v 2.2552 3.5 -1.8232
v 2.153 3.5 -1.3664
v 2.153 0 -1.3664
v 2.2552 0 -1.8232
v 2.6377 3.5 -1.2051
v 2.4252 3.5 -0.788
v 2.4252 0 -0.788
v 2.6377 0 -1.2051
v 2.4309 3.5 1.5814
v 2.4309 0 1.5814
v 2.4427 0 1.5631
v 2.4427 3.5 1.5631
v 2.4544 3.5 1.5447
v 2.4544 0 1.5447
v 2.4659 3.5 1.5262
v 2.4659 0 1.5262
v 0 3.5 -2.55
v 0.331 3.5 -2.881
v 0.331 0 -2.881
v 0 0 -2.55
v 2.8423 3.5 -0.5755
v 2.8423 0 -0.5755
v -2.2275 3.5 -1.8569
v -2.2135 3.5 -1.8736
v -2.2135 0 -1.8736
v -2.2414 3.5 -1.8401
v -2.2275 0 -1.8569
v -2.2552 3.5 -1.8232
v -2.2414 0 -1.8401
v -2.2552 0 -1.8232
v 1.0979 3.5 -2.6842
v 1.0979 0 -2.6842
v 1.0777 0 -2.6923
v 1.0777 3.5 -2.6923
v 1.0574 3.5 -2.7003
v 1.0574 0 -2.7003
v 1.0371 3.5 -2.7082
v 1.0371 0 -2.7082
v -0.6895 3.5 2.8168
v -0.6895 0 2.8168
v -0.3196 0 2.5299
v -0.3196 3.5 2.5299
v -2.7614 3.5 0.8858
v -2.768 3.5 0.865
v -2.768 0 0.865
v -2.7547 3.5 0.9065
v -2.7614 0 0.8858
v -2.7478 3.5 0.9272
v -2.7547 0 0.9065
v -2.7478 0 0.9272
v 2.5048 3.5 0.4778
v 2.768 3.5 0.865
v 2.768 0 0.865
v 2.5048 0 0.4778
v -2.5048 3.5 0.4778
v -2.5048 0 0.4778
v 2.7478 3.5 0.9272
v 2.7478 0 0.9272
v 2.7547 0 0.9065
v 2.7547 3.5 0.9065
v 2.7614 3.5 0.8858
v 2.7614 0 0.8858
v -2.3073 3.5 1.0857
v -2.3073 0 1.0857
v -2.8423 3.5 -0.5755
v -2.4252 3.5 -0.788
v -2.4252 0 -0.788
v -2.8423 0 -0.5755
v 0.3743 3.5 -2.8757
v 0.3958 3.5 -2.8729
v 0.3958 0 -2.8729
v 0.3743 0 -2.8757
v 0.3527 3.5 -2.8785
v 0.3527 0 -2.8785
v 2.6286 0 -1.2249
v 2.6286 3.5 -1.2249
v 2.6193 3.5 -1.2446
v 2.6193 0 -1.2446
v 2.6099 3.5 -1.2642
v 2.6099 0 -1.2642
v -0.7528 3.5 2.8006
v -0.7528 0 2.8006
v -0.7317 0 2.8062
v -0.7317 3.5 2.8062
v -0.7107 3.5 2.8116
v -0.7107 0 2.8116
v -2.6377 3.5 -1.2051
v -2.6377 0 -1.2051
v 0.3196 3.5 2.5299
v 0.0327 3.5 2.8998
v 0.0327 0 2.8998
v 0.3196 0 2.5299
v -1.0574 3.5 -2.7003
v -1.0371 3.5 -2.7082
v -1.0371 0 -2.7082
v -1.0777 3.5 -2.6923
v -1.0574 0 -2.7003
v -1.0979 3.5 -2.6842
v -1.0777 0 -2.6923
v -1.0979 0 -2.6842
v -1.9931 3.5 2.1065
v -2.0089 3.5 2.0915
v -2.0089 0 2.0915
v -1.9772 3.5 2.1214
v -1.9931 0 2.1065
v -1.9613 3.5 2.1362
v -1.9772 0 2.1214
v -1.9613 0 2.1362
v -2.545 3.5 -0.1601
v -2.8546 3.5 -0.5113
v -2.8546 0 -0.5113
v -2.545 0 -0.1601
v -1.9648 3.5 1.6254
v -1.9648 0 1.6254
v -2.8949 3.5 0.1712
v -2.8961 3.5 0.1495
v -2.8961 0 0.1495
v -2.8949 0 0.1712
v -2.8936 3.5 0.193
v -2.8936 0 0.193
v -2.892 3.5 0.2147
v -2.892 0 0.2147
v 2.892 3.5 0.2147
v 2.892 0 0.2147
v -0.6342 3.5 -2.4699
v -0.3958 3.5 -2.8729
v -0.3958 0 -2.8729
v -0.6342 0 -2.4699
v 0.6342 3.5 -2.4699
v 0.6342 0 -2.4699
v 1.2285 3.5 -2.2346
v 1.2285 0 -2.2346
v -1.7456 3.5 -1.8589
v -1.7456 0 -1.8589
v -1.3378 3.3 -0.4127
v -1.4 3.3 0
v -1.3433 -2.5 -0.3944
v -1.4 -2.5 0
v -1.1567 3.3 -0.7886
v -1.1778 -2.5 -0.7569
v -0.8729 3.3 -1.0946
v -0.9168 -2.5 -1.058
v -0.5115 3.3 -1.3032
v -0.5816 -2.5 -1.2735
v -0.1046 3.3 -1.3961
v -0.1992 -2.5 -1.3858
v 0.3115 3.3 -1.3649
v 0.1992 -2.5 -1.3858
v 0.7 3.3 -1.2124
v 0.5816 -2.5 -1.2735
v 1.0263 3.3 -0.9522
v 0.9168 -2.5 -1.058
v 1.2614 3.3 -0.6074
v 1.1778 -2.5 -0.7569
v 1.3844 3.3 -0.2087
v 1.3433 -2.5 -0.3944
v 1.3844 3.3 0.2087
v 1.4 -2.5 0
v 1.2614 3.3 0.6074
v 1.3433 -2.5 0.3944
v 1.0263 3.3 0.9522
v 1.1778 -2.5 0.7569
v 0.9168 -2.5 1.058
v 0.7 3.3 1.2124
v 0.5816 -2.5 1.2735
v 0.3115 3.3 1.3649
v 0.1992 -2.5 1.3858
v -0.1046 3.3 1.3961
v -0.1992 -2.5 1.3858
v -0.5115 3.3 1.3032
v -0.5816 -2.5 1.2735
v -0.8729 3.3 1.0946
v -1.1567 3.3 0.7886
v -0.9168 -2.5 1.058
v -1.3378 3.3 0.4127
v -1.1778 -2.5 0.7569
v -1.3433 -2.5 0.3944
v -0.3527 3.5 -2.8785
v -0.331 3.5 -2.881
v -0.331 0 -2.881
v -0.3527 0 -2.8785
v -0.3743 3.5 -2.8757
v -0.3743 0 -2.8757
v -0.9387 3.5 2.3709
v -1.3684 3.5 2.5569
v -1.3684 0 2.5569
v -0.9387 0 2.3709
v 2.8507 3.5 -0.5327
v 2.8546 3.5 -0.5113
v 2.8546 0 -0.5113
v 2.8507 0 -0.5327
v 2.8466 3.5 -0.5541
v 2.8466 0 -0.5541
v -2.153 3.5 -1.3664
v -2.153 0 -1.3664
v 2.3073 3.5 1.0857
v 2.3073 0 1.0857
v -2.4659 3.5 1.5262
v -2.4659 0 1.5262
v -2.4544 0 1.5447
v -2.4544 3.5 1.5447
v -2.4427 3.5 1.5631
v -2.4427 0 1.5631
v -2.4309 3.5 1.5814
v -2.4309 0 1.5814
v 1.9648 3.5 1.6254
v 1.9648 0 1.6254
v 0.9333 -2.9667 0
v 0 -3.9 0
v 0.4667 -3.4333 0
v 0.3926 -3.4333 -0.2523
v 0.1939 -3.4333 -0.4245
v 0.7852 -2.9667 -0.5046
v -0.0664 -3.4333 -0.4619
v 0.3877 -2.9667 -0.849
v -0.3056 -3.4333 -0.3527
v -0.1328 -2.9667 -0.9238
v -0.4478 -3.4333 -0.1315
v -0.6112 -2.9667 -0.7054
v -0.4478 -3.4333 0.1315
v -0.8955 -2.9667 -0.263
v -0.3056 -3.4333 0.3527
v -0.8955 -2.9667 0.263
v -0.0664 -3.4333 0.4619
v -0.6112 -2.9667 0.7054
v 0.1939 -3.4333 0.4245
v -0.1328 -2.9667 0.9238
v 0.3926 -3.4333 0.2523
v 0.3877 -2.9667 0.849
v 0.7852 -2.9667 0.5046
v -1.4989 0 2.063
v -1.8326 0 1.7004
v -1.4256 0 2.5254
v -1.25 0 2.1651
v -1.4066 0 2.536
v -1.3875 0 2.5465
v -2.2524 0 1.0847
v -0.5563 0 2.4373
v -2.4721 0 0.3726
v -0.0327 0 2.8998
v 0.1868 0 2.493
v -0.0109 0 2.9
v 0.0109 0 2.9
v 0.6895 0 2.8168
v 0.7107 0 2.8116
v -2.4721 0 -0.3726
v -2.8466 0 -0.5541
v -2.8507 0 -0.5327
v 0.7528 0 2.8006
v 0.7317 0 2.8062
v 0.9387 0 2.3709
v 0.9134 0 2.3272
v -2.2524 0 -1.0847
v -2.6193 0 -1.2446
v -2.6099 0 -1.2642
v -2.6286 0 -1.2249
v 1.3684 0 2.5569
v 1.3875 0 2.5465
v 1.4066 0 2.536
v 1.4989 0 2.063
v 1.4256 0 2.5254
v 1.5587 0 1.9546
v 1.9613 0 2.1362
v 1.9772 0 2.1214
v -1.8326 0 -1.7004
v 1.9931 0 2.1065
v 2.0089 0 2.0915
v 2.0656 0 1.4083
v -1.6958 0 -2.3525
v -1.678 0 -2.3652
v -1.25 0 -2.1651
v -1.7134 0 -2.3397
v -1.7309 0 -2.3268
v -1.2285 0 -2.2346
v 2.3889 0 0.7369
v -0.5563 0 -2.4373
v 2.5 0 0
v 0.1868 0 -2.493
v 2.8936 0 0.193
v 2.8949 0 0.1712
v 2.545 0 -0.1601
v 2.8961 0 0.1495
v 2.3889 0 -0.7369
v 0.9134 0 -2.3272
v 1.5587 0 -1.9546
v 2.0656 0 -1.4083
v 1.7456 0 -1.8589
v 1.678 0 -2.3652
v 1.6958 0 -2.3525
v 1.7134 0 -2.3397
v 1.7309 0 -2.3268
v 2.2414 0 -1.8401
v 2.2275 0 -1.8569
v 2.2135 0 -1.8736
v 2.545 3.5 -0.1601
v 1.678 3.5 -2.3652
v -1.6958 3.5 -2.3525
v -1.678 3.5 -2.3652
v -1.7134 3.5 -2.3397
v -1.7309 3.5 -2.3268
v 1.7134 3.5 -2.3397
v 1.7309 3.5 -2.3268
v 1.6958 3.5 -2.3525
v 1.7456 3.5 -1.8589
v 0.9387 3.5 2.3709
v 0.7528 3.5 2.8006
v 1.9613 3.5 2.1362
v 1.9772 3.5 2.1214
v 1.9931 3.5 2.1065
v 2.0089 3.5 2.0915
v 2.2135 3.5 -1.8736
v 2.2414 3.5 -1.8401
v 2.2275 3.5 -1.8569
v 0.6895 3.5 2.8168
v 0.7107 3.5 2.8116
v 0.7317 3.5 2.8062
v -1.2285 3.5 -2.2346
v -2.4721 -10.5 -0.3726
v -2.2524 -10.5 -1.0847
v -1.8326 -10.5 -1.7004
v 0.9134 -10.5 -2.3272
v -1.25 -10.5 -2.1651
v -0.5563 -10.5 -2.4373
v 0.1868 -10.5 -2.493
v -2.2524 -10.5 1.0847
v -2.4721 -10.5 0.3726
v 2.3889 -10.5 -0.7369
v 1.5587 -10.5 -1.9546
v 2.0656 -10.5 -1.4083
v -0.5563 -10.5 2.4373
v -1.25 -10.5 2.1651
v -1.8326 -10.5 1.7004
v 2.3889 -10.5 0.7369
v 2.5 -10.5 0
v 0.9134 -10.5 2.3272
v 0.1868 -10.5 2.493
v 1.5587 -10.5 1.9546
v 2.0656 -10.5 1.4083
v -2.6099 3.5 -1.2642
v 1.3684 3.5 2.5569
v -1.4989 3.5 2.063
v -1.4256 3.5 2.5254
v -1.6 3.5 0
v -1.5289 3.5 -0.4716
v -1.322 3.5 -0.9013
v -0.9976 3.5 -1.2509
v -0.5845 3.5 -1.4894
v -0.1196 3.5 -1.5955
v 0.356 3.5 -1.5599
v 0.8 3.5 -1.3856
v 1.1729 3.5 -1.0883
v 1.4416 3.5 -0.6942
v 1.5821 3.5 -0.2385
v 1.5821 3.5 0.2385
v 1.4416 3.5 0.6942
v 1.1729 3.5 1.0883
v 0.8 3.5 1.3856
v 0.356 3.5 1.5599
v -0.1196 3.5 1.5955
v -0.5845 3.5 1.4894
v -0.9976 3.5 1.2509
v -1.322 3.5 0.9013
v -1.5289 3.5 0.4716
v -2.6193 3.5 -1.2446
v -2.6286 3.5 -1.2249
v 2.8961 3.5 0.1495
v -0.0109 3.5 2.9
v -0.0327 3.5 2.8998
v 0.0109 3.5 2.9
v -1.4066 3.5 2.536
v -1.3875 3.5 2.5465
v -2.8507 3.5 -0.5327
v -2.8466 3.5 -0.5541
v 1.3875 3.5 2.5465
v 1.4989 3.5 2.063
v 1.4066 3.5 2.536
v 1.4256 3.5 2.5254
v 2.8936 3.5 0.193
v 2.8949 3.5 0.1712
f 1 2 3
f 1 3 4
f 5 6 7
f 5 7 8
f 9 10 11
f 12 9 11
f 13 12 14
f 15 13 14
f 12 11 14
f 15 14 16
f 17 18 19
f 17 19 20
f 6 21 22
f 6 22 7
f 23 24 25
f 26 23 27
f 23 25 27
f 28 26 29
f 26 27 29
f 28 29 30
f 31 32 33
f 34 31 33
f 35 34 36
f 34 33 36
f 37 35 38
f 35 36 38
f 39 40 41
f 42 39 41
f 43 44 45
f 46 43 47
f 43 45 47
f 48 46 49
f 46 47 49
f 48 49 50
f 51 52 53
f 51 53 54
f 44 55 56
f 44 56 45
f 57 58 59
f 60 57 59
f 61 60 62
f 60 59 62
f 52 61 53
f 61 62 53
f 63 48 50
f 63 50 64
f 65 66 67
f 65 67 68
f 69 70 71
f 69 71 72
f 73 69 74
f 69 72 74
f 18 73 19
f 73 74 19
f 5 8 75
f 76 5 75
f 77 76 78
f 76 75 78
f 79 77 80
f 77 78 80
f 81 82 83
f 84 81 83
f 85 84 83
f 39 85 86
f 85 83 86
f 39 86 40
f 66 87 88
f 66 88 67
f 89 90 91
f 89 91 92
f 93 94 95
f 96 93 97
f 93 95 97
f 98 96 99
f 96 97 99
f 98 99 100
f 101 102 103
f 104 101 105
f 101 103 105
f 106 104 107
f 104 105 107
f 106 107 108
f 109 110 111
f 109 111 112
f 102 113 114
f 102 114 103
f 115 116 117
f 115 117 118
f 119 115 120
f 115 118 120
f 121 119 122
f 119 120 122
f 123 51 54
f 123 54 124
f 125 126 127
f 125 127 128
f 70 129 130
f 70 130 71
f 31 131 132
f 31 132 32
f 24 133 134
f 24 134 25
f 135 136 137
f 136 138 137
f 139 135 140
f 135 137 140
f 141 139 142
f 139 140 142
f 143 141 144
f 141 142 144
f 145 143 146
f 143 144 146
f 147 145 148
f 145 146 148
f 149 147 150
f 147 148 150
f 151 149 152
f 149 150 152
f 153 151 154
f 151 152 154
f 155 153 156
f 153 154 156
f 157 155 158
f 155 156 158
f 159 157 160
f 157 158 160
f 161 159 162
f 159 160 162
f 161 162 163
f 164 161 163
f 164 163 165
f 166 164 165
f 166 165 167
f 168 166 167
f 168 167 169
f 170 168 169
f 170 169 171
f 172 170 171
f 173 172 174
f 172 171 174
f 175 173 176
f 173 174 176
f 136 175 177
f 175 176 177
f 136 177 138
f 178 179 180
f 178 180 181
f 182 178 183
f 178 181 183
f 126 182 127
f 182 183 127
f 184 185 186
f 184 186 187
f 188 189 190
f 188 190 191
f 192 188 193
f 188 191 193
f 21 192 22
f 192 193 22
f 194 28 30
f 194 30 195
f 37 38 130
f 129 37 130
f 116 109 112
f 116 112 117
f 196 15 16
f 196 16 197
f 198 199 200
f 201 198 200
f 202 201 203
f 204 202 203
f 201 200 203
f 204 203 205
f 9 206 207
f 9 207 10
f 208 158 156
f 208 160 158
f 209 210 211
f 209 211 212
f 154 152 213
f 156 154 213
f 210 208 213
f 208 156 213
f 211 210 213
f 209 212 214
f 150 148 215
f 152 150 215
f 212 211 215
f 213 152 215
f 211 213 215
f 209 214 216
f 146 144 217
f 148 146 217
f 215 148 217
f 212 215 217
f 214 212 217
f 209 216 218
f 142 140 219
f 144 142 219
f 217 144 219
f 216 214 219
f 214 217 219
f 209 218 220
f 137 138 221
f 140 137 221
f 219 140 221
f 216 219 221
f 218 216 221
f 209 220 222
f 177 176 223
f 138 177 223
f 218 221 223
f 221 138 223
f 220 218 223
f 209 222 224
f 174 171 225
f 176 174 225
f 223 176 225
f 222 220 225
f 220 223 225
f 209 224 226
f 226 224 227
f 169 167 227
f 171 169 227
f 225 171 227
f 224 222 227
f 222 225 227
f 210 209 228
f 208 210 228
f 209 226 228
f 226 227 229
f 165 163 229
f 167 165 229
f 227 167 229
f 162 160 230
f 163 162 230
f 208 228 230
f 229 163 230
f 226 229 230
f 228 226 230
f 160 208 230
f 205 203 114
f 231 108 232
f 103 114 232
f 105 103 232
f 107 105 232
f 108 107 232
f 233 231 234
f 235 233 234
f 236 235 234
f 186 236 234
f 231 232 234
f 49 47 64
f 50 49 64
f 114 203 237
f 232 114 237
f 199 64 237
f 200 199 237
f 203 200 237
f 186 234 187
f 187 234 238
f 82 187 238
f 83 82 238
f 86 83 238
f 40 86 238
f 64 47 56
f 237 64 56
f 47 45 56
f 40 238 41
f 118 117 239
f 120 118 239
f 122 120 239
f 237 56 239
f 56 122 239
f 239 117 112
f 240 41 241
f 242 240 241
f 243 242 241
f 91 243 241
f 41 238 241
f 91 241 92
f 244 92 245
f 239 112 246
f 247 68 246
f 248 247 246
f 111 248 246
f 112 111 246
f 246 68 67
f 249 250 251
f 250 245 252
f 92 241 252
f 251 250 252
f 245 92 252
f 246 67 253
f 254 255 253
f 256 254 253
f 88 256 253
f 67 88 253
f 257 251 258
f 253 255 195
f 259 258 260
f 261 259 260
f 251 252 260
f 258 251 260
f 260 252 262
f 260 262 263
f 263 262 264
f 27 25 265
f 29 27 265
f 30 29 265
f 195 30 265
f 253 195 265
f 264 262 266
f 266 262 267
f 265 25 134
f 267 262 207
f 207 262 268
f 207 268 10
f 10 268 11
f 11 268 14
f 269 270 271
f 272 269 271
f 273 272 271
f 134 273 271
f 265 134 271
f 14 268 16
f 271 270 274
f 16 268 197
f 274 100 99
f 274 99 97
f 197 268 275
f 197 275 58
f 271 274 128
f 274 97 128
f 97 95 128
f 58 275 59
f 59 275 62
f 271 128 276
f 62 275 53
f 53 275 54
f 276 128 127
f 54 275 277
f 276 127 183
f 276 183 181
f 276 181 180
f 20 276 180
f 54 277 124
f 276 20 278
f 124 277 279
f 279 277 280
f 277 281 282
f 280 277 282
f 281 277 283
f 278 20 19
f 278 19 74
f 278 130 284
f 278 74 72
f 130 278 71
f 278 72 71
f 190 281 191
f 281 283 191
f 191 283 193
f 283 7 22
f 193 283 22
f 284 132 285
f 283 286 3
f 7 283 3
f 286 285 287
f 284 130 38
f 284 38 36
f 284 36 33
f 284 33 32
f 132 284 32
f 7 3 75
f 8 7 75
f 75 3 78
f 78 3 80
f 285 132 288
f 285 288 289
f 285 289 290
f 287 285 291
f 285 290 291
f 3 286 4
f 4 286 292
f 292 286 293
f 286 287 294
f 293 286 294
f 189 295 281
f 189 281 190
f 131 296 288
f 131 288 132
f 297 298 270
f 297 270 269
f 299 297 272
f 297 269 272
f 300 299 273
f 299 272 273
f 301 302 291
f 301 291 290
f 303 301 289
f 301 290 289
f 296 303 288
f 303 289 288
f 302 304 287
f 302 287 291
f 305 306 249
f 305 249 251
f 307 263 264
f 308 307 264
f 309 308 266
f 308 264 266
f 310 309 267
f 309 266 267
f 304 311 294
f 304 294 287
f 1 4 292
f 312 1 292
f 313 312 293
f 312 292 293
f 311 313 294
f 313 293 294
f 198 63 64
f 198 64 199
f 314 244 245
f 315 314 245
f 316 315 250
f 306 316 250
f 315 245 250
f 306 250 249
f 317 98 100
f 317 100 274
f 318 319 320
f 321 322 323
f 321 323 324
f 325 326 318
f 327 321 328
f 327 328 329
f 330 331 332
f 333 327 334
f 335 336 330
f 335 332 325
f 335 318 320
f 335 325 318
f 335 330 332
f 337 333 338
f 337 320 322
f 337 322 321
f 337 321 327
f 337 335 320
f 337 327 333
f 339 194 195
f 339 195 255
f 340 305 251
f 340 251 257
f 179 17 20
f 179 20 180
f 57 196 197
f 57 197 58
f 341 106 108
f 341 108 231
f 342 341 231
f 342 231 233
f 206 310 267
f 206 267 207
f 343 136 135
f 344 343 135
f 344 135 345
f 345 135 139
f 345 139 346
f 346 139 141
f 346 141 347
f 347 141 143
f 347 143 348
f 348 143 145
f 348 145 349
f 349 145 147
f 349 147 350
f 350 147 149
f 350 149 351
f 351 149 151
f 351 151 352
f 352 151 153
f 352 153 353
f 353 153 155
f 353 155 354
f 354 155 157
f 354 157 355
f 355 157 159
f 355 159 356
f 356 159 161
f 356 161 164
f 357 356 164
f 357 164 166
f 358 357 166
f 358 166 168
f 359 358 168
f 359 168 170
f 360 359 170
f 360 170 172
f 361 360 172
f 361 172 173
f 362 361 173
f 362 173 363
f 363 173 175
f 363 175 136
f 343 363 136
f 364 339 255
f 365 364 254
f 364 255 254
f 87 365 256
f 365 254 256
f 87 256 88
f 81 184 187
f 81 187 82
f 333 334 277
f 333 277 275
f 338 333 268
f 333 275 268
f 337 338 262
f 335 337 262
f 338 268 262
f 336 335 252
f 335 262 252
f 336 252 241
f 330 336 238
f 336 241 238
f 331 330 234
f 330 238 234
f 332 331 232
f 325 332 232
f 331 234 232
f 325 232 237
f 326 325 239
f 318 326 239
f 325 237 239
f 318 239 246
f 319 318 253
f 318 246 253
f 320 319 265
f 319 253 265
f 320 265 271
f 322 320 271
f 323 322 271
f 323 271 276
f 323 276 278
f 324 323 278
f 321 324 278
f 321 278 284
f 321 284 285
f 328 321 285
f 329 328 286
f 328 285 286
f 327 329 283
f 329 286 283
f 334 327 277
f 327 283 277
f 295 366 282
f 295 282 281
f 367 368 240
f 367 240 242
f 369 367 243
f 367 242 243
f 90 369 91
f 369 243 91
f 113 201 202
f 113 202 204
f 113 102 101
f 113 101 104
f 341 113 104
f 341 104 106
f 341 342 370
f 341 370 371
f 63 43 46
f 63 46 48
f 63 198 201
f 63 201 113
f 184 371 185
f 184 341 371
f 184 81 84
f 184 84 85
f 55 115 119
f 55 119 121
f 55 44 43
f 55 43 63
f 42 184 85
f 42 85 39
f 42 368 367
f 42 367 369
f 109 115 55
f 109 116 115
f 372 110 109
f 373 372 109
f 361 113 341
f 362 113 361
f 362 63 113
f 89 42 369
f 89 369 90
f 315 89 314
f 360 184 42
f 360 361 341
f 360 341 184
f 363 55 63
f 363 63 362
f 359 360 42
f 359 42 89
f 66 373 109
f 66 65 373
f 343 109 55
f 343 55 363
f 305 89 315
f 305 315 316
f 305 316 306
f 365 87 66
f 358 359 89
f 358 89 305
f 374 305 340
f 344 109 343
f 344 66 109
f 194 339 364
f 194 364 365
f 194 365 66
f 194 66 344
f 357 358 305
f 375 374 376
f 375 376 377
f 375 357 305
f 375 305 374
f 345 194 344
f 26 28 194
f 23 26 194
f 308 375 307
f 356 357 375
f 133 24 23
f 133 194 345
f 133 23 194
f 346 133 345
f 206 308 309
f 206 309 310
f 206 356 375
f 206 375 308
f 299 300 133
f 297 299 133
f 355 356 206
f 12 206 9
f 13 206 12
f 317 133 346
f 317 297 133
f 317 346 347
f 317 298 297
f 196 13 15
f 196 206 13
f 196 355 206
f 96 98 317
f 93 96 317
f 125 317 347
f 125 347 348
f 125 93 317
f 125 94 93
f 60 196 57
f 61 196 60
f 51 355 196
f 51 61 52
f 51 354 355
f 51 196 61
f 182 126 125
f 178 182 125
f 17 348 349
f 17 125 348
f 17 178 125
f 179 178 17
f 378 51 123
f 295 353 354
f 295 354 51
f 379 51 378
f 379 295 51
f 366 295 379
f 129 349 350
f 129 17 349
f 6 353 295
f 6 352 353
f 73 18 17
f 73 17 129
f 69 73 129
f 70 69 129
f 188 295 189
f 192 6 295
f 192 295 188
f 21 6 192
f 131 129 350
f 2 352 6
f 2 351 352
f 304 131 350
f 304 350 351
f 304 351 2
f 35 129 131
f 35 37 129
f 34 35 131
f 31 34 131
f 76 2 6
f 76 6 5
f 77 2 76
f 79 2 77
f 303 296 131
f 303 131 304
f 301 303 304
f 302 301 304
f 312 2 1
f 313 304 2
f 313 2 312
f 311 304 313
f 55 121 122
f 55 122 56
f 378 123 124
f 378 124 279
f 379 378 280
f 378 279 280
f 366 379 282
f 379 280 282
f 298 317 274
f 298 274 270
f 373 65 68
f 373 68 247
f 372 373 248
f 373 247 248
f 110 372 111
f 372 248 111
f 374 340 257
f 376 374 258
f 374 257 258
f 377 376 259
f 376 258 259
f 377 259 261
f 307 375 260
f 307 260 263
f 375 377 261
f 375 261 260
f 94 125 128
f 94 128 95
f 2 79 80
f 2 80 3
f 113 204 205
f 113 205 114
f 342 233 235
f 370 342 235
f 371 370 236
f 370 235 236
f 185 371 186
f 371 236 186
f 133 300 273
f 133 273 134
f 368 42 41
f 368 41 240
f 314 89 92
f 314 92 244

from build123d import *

# Parameters (mm, degrees)
SKETCH_1_R                  = 2.9
EXTRUDE_1_DEPTH             = 3.5
SKETCH_2_R                  = 2.5
EXTRUDE_2_DEPTH             = 10.5
CUT_EXTRUDE_1_DEPTH         = 4
HOLE_WIZARD_M32_D           = 2.8
HOLE_WIZARD_M32_DEPTH       = 6
HOLE_WIZARD_M32_CSINK_D     = 3.2
HOLE_WIZARD_M32_CSINK_ANGLE = 90
HOLE_WIZARD_M32_TIP         = 1.4


with BuildPart() as part:
    # Эскиз1 → Бобышка-Вытянуть1 (new body)
    with BuildSketch(Plane(origin=(0, 0, 0), x_dir=(1, 0, 0), z_dir=(0, 1, 0))):
        Circle(SKETCH_1_R)
    extrude(amount=EXTRUDE_1_DEPTH)

    # Эскиз2 → Бобышка-Вытянуть2 (add)
    with BuildSketch(Plane.XZ):
        Circle(SKETCH_2_R)
    extrude(amount=EXTRUDE_2_DEPTH)

    # Эскиз3 → Вырез-Вытянуть1 (cut)
    with BuildSketch(Plane(origin=(0, 3.5, 0), x_dir=(1, 0, 0), z_dir=(0, 1, 0))):
        Polygon((0, 2.55), (-0.366495157, 2.916495157), (0.366495157, 2.916495157), align=None)
        Polygon((0.634159212, 2.469887061), (0.370321814, 2.916011738), (1.080283889, 2.733724459), align=None)
        Polygon((1.228471869, 2.234582034), (1.083870103, 2.732304577), (1.726194412, 2.3791838), align=None)
        Polygon((1.74559512, 1.85887), (1.729314848, 2.37691667), (2.263641791, 1.875150272), align=None)
        Polygon((2.15303621, 1.366358327), (2.26610038, 1.872178348), (2.658856231, 1.253294157), align=None)
        Polygon((2.425194117, 0.787993336), (2.660498492, 1.249804175), (2.887004956, 0.55268896), align=None)
        Polygon((2.544968157, 0.160115825), (2.887727699, 0.548900209), (2.933752541, -0.182643716), align=None)
        Polygon((2.504832489, -0.477822352), (2.933510354, -0.186493176), (2.796161665, -0.906500217), align=None)
        Polygon((2.307308984, -1.085737193), (2.794969765, -0.910168509), (2.482877668, -1.573397974), align=None)
        Polygon((1.964808769, -1.625431174), (2.480810946, -1.576654607), (2.013585336, -2.141433351), align=None)
        Polygon((1.498852393, -2.062993336), (2.010773652, -2.144073698), (1.417772031, -2.574914594), align=None)
        Polygon((0.938717609, -2.370930039), (1.414392054, -2.576772752), (0.732874896, -2.846604484), align=None)
        Polygon((0.319599746, -2.529892488), (0.729139002, -2.847563698), (0.001928536, -2.939431745), align=None)
        Polygon((-0.319599746, -2.529892488), (-0.001928536, -2.939431745), (-0.729139002, -2.847563698), align=None)
        Polygon((-0.938717609, -2.370930039), (-0.732874896, -2.846604484), (-1.414392054, -2.576772752), align=None)
        Polygon((-1.498852393, -2.062993336), (-1.417772031, -2.574914594), (-2.010773652, -2.144073698), align=None)
        Polygon((-1.964808769, -1.625431174), (-2.013585336, -2.141433351), (-2.480810946, -1.576654607), align=None)
        Polygon((-2.307308984, -1.085737193), (-2.482877668, -1.573397974), (-2.794969765, -0.910168509), align=None)
        Polygon((-2.504832489, -0.477822352), (-2.796161665, -0.906500217), (-2.933510354, -0.186493176), align=None)
        Polygon((-2.544968157, 0.160115825), (-2.933752541, -0.182643716), (-2.887727699, 0.548900209), align=None)
        Polygon((-2.425194117, 0.787993336), (-2.887004956, 0.55268896), (-2.660498492, 1.249804175), align=None)
        Polygon((-2.15303621, 1.366358327), (-2.658856231, 1.253294157), (-2.26610038, 1.872178348), align=None)
        Polygon((-1.74559512, 1.85887), (-2.263641791, 1.875150272), (-1.729314848, 2.37691667), align=None)
        Polygon((-1.228471869, 2.234582034), (-1.726194412, 2.3791838), (-1.083870103, 2.732304577), align=None)
        Polygon((-0.634159212, 2.469887061), (-1.080283889, 2.733724459), (-0.370321814, 2.916011738), align=None)
    extrude(amount=-CUT_EXTRUDE_1_DEPTH, mode=Mode.SUBTRACT)

    # Сверло под метчик  спиральное M32
    with Locations(Plane(origin=(0, 3.5, 0), x_dir=(1, 0, 0), z_dir=(0, 1, 0))):
        with Locations((0, 0)):
            CounterSinkHole(HOLE_WIZARD_M32_D / 2, HOLE_WIZARD_M32_CSINK_D / 2, depth=HOLE_WIZARD_M32_DEPTH, counter_sink_angle=HOLE_WIZARD_M32_CSINK_ANGLE)
            with Locations((0, 0, -(HOLE_WIZARD_M32_DEPTH + HOLE_WIZARD_M32_TIP / 2))):  # 90° drill point
                Cone(0, HOLE_WIZARD_M32_D / 2, HOLE_WIZARD_M32_TIP, mode=Mode.SUBTRACT)


solid = part.part
